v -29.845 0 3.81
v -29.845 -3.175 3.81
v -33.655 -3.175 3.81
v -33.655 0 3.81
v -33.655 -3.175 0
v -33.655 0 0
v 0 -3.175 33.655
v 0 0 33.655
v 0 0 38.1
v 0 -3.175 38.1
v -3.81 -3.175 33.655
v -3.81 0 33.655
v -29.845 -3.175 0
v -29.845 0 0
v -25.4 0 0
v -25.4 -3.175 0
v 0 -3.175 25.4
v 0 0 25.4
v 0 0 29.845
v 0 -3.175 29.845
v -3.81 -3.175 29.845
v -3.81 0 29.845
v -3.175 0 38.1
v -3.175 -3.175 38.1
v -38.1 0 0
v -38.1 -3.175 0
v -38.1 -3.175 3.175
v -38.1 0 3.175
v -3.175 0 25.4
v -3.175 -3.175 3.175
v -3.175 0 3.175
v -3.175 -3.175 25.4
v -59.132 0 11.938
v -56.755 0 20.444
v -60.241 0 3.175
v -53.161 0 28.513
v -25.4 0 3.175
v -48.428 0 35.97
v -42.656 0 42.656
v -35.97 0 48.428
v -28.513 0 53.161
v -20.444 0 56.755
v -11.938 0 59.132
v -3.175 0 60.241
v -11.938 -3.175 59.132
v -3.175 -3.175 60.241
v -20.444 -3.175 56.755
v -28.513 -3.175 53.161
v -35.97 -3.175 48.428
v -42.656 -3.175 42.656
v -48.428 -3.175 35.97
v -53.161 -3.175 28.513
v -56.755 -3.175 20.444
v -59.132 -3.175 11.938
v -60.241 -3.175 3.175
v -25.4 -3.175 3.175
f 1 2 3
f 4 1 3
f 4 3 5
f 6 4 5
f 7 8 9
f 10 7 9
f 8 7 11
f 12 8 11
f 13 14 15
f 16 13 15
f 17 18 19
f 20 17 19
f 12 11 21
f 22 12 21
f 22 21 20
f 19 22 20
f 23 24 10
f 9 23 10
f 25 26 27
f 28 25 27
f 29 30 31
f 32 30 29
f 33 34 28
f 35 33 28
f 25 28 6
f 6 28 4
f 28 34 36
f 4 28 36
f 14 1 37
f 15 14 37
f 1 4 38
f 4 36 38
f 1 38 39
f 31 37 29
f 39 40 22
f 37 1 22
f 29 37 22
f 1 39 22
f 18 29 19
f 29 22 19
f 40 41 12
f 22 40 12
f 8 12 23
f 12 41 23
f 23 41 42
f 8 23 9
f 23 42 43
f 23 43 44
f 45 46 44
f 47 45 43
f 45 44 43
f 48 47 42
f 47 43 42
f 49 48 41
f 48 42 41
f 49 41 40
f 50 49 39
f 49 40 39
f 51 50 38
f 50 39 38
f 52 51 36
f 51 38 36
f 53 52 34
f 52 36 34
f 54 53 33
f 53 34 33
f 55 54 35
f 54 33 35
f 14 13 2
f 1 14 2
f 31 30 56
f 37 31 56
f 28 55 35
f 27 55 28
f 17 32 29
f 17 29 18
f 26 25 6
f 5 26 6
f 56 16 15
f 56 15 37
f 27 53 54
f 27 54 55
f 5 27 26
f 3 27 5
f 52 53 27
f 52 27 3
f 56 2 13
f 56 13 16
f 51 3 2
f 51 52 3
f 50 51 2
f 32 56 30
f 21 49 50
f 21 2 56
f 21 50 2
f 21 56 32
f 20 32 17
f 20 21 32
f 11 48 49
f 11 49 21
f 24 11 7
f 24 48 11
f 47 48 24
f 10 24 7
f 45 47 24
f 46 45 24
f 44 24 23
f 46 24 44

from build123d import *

# Parameters (mm, degrees)
F1_DEPTH = 3.175
F2_W     = 22.225
F2_H     = 3.175
F2_W_2   = 3.175
F2_H_2   = 22.225
F3_DEPTH = 25.4


with BuildPart() as f1:
    # F0 (on Front) → F1 (new body)
    with BuildSketch(Plane.XZ):
        with BuildLine():
            Line((-60.325, 0), (0, 0))
            Line((0, 0), (0, 60.325))
            ThreePointArc((0, 60.325), (-42.656217, 42.656217), (-60.325, 0))
        make_face()
    extrude(amount=F1_DEPTH)

    # F2 (on face) → F3 (cut)
    with BuildSketch(Plane.XZ.offset(3.175)):
        with Locations((-49.2125, 1.5875)):
            Rectangle(F2_W, F2_H)
        with Locations((-1.5875, 1.5875)):
            Rectangle(F2_W_2, F2_H)
        with Locations((-14.2875, 1.5875)):
            Rectangle(F2_W, F2_H)
        with Locations((-1.5875, 14.2875)):
            Rectangle(F2_W_2, F2_H_2)
        with Locations((-1.5875, 49.2125)):
            Rectangle(F2_W_2, F2_H_2)
        Polygon((0, 29.845), (0, 31.75), (0, 33.655), (-3.81, 33.655), (-3.81, 31.75), (-3.81, 29.845), align=None)
        Polygon((-33.655, 0), (-31.75, 0), (-29.845, 0), (-29.845, 3.81), (-31.75, 3.81), (-33.655, 3.81), align=None)
    extrude(amount=-F3_DEPTH, mode=Mode.SUBTRACT)


solid = f1.part
